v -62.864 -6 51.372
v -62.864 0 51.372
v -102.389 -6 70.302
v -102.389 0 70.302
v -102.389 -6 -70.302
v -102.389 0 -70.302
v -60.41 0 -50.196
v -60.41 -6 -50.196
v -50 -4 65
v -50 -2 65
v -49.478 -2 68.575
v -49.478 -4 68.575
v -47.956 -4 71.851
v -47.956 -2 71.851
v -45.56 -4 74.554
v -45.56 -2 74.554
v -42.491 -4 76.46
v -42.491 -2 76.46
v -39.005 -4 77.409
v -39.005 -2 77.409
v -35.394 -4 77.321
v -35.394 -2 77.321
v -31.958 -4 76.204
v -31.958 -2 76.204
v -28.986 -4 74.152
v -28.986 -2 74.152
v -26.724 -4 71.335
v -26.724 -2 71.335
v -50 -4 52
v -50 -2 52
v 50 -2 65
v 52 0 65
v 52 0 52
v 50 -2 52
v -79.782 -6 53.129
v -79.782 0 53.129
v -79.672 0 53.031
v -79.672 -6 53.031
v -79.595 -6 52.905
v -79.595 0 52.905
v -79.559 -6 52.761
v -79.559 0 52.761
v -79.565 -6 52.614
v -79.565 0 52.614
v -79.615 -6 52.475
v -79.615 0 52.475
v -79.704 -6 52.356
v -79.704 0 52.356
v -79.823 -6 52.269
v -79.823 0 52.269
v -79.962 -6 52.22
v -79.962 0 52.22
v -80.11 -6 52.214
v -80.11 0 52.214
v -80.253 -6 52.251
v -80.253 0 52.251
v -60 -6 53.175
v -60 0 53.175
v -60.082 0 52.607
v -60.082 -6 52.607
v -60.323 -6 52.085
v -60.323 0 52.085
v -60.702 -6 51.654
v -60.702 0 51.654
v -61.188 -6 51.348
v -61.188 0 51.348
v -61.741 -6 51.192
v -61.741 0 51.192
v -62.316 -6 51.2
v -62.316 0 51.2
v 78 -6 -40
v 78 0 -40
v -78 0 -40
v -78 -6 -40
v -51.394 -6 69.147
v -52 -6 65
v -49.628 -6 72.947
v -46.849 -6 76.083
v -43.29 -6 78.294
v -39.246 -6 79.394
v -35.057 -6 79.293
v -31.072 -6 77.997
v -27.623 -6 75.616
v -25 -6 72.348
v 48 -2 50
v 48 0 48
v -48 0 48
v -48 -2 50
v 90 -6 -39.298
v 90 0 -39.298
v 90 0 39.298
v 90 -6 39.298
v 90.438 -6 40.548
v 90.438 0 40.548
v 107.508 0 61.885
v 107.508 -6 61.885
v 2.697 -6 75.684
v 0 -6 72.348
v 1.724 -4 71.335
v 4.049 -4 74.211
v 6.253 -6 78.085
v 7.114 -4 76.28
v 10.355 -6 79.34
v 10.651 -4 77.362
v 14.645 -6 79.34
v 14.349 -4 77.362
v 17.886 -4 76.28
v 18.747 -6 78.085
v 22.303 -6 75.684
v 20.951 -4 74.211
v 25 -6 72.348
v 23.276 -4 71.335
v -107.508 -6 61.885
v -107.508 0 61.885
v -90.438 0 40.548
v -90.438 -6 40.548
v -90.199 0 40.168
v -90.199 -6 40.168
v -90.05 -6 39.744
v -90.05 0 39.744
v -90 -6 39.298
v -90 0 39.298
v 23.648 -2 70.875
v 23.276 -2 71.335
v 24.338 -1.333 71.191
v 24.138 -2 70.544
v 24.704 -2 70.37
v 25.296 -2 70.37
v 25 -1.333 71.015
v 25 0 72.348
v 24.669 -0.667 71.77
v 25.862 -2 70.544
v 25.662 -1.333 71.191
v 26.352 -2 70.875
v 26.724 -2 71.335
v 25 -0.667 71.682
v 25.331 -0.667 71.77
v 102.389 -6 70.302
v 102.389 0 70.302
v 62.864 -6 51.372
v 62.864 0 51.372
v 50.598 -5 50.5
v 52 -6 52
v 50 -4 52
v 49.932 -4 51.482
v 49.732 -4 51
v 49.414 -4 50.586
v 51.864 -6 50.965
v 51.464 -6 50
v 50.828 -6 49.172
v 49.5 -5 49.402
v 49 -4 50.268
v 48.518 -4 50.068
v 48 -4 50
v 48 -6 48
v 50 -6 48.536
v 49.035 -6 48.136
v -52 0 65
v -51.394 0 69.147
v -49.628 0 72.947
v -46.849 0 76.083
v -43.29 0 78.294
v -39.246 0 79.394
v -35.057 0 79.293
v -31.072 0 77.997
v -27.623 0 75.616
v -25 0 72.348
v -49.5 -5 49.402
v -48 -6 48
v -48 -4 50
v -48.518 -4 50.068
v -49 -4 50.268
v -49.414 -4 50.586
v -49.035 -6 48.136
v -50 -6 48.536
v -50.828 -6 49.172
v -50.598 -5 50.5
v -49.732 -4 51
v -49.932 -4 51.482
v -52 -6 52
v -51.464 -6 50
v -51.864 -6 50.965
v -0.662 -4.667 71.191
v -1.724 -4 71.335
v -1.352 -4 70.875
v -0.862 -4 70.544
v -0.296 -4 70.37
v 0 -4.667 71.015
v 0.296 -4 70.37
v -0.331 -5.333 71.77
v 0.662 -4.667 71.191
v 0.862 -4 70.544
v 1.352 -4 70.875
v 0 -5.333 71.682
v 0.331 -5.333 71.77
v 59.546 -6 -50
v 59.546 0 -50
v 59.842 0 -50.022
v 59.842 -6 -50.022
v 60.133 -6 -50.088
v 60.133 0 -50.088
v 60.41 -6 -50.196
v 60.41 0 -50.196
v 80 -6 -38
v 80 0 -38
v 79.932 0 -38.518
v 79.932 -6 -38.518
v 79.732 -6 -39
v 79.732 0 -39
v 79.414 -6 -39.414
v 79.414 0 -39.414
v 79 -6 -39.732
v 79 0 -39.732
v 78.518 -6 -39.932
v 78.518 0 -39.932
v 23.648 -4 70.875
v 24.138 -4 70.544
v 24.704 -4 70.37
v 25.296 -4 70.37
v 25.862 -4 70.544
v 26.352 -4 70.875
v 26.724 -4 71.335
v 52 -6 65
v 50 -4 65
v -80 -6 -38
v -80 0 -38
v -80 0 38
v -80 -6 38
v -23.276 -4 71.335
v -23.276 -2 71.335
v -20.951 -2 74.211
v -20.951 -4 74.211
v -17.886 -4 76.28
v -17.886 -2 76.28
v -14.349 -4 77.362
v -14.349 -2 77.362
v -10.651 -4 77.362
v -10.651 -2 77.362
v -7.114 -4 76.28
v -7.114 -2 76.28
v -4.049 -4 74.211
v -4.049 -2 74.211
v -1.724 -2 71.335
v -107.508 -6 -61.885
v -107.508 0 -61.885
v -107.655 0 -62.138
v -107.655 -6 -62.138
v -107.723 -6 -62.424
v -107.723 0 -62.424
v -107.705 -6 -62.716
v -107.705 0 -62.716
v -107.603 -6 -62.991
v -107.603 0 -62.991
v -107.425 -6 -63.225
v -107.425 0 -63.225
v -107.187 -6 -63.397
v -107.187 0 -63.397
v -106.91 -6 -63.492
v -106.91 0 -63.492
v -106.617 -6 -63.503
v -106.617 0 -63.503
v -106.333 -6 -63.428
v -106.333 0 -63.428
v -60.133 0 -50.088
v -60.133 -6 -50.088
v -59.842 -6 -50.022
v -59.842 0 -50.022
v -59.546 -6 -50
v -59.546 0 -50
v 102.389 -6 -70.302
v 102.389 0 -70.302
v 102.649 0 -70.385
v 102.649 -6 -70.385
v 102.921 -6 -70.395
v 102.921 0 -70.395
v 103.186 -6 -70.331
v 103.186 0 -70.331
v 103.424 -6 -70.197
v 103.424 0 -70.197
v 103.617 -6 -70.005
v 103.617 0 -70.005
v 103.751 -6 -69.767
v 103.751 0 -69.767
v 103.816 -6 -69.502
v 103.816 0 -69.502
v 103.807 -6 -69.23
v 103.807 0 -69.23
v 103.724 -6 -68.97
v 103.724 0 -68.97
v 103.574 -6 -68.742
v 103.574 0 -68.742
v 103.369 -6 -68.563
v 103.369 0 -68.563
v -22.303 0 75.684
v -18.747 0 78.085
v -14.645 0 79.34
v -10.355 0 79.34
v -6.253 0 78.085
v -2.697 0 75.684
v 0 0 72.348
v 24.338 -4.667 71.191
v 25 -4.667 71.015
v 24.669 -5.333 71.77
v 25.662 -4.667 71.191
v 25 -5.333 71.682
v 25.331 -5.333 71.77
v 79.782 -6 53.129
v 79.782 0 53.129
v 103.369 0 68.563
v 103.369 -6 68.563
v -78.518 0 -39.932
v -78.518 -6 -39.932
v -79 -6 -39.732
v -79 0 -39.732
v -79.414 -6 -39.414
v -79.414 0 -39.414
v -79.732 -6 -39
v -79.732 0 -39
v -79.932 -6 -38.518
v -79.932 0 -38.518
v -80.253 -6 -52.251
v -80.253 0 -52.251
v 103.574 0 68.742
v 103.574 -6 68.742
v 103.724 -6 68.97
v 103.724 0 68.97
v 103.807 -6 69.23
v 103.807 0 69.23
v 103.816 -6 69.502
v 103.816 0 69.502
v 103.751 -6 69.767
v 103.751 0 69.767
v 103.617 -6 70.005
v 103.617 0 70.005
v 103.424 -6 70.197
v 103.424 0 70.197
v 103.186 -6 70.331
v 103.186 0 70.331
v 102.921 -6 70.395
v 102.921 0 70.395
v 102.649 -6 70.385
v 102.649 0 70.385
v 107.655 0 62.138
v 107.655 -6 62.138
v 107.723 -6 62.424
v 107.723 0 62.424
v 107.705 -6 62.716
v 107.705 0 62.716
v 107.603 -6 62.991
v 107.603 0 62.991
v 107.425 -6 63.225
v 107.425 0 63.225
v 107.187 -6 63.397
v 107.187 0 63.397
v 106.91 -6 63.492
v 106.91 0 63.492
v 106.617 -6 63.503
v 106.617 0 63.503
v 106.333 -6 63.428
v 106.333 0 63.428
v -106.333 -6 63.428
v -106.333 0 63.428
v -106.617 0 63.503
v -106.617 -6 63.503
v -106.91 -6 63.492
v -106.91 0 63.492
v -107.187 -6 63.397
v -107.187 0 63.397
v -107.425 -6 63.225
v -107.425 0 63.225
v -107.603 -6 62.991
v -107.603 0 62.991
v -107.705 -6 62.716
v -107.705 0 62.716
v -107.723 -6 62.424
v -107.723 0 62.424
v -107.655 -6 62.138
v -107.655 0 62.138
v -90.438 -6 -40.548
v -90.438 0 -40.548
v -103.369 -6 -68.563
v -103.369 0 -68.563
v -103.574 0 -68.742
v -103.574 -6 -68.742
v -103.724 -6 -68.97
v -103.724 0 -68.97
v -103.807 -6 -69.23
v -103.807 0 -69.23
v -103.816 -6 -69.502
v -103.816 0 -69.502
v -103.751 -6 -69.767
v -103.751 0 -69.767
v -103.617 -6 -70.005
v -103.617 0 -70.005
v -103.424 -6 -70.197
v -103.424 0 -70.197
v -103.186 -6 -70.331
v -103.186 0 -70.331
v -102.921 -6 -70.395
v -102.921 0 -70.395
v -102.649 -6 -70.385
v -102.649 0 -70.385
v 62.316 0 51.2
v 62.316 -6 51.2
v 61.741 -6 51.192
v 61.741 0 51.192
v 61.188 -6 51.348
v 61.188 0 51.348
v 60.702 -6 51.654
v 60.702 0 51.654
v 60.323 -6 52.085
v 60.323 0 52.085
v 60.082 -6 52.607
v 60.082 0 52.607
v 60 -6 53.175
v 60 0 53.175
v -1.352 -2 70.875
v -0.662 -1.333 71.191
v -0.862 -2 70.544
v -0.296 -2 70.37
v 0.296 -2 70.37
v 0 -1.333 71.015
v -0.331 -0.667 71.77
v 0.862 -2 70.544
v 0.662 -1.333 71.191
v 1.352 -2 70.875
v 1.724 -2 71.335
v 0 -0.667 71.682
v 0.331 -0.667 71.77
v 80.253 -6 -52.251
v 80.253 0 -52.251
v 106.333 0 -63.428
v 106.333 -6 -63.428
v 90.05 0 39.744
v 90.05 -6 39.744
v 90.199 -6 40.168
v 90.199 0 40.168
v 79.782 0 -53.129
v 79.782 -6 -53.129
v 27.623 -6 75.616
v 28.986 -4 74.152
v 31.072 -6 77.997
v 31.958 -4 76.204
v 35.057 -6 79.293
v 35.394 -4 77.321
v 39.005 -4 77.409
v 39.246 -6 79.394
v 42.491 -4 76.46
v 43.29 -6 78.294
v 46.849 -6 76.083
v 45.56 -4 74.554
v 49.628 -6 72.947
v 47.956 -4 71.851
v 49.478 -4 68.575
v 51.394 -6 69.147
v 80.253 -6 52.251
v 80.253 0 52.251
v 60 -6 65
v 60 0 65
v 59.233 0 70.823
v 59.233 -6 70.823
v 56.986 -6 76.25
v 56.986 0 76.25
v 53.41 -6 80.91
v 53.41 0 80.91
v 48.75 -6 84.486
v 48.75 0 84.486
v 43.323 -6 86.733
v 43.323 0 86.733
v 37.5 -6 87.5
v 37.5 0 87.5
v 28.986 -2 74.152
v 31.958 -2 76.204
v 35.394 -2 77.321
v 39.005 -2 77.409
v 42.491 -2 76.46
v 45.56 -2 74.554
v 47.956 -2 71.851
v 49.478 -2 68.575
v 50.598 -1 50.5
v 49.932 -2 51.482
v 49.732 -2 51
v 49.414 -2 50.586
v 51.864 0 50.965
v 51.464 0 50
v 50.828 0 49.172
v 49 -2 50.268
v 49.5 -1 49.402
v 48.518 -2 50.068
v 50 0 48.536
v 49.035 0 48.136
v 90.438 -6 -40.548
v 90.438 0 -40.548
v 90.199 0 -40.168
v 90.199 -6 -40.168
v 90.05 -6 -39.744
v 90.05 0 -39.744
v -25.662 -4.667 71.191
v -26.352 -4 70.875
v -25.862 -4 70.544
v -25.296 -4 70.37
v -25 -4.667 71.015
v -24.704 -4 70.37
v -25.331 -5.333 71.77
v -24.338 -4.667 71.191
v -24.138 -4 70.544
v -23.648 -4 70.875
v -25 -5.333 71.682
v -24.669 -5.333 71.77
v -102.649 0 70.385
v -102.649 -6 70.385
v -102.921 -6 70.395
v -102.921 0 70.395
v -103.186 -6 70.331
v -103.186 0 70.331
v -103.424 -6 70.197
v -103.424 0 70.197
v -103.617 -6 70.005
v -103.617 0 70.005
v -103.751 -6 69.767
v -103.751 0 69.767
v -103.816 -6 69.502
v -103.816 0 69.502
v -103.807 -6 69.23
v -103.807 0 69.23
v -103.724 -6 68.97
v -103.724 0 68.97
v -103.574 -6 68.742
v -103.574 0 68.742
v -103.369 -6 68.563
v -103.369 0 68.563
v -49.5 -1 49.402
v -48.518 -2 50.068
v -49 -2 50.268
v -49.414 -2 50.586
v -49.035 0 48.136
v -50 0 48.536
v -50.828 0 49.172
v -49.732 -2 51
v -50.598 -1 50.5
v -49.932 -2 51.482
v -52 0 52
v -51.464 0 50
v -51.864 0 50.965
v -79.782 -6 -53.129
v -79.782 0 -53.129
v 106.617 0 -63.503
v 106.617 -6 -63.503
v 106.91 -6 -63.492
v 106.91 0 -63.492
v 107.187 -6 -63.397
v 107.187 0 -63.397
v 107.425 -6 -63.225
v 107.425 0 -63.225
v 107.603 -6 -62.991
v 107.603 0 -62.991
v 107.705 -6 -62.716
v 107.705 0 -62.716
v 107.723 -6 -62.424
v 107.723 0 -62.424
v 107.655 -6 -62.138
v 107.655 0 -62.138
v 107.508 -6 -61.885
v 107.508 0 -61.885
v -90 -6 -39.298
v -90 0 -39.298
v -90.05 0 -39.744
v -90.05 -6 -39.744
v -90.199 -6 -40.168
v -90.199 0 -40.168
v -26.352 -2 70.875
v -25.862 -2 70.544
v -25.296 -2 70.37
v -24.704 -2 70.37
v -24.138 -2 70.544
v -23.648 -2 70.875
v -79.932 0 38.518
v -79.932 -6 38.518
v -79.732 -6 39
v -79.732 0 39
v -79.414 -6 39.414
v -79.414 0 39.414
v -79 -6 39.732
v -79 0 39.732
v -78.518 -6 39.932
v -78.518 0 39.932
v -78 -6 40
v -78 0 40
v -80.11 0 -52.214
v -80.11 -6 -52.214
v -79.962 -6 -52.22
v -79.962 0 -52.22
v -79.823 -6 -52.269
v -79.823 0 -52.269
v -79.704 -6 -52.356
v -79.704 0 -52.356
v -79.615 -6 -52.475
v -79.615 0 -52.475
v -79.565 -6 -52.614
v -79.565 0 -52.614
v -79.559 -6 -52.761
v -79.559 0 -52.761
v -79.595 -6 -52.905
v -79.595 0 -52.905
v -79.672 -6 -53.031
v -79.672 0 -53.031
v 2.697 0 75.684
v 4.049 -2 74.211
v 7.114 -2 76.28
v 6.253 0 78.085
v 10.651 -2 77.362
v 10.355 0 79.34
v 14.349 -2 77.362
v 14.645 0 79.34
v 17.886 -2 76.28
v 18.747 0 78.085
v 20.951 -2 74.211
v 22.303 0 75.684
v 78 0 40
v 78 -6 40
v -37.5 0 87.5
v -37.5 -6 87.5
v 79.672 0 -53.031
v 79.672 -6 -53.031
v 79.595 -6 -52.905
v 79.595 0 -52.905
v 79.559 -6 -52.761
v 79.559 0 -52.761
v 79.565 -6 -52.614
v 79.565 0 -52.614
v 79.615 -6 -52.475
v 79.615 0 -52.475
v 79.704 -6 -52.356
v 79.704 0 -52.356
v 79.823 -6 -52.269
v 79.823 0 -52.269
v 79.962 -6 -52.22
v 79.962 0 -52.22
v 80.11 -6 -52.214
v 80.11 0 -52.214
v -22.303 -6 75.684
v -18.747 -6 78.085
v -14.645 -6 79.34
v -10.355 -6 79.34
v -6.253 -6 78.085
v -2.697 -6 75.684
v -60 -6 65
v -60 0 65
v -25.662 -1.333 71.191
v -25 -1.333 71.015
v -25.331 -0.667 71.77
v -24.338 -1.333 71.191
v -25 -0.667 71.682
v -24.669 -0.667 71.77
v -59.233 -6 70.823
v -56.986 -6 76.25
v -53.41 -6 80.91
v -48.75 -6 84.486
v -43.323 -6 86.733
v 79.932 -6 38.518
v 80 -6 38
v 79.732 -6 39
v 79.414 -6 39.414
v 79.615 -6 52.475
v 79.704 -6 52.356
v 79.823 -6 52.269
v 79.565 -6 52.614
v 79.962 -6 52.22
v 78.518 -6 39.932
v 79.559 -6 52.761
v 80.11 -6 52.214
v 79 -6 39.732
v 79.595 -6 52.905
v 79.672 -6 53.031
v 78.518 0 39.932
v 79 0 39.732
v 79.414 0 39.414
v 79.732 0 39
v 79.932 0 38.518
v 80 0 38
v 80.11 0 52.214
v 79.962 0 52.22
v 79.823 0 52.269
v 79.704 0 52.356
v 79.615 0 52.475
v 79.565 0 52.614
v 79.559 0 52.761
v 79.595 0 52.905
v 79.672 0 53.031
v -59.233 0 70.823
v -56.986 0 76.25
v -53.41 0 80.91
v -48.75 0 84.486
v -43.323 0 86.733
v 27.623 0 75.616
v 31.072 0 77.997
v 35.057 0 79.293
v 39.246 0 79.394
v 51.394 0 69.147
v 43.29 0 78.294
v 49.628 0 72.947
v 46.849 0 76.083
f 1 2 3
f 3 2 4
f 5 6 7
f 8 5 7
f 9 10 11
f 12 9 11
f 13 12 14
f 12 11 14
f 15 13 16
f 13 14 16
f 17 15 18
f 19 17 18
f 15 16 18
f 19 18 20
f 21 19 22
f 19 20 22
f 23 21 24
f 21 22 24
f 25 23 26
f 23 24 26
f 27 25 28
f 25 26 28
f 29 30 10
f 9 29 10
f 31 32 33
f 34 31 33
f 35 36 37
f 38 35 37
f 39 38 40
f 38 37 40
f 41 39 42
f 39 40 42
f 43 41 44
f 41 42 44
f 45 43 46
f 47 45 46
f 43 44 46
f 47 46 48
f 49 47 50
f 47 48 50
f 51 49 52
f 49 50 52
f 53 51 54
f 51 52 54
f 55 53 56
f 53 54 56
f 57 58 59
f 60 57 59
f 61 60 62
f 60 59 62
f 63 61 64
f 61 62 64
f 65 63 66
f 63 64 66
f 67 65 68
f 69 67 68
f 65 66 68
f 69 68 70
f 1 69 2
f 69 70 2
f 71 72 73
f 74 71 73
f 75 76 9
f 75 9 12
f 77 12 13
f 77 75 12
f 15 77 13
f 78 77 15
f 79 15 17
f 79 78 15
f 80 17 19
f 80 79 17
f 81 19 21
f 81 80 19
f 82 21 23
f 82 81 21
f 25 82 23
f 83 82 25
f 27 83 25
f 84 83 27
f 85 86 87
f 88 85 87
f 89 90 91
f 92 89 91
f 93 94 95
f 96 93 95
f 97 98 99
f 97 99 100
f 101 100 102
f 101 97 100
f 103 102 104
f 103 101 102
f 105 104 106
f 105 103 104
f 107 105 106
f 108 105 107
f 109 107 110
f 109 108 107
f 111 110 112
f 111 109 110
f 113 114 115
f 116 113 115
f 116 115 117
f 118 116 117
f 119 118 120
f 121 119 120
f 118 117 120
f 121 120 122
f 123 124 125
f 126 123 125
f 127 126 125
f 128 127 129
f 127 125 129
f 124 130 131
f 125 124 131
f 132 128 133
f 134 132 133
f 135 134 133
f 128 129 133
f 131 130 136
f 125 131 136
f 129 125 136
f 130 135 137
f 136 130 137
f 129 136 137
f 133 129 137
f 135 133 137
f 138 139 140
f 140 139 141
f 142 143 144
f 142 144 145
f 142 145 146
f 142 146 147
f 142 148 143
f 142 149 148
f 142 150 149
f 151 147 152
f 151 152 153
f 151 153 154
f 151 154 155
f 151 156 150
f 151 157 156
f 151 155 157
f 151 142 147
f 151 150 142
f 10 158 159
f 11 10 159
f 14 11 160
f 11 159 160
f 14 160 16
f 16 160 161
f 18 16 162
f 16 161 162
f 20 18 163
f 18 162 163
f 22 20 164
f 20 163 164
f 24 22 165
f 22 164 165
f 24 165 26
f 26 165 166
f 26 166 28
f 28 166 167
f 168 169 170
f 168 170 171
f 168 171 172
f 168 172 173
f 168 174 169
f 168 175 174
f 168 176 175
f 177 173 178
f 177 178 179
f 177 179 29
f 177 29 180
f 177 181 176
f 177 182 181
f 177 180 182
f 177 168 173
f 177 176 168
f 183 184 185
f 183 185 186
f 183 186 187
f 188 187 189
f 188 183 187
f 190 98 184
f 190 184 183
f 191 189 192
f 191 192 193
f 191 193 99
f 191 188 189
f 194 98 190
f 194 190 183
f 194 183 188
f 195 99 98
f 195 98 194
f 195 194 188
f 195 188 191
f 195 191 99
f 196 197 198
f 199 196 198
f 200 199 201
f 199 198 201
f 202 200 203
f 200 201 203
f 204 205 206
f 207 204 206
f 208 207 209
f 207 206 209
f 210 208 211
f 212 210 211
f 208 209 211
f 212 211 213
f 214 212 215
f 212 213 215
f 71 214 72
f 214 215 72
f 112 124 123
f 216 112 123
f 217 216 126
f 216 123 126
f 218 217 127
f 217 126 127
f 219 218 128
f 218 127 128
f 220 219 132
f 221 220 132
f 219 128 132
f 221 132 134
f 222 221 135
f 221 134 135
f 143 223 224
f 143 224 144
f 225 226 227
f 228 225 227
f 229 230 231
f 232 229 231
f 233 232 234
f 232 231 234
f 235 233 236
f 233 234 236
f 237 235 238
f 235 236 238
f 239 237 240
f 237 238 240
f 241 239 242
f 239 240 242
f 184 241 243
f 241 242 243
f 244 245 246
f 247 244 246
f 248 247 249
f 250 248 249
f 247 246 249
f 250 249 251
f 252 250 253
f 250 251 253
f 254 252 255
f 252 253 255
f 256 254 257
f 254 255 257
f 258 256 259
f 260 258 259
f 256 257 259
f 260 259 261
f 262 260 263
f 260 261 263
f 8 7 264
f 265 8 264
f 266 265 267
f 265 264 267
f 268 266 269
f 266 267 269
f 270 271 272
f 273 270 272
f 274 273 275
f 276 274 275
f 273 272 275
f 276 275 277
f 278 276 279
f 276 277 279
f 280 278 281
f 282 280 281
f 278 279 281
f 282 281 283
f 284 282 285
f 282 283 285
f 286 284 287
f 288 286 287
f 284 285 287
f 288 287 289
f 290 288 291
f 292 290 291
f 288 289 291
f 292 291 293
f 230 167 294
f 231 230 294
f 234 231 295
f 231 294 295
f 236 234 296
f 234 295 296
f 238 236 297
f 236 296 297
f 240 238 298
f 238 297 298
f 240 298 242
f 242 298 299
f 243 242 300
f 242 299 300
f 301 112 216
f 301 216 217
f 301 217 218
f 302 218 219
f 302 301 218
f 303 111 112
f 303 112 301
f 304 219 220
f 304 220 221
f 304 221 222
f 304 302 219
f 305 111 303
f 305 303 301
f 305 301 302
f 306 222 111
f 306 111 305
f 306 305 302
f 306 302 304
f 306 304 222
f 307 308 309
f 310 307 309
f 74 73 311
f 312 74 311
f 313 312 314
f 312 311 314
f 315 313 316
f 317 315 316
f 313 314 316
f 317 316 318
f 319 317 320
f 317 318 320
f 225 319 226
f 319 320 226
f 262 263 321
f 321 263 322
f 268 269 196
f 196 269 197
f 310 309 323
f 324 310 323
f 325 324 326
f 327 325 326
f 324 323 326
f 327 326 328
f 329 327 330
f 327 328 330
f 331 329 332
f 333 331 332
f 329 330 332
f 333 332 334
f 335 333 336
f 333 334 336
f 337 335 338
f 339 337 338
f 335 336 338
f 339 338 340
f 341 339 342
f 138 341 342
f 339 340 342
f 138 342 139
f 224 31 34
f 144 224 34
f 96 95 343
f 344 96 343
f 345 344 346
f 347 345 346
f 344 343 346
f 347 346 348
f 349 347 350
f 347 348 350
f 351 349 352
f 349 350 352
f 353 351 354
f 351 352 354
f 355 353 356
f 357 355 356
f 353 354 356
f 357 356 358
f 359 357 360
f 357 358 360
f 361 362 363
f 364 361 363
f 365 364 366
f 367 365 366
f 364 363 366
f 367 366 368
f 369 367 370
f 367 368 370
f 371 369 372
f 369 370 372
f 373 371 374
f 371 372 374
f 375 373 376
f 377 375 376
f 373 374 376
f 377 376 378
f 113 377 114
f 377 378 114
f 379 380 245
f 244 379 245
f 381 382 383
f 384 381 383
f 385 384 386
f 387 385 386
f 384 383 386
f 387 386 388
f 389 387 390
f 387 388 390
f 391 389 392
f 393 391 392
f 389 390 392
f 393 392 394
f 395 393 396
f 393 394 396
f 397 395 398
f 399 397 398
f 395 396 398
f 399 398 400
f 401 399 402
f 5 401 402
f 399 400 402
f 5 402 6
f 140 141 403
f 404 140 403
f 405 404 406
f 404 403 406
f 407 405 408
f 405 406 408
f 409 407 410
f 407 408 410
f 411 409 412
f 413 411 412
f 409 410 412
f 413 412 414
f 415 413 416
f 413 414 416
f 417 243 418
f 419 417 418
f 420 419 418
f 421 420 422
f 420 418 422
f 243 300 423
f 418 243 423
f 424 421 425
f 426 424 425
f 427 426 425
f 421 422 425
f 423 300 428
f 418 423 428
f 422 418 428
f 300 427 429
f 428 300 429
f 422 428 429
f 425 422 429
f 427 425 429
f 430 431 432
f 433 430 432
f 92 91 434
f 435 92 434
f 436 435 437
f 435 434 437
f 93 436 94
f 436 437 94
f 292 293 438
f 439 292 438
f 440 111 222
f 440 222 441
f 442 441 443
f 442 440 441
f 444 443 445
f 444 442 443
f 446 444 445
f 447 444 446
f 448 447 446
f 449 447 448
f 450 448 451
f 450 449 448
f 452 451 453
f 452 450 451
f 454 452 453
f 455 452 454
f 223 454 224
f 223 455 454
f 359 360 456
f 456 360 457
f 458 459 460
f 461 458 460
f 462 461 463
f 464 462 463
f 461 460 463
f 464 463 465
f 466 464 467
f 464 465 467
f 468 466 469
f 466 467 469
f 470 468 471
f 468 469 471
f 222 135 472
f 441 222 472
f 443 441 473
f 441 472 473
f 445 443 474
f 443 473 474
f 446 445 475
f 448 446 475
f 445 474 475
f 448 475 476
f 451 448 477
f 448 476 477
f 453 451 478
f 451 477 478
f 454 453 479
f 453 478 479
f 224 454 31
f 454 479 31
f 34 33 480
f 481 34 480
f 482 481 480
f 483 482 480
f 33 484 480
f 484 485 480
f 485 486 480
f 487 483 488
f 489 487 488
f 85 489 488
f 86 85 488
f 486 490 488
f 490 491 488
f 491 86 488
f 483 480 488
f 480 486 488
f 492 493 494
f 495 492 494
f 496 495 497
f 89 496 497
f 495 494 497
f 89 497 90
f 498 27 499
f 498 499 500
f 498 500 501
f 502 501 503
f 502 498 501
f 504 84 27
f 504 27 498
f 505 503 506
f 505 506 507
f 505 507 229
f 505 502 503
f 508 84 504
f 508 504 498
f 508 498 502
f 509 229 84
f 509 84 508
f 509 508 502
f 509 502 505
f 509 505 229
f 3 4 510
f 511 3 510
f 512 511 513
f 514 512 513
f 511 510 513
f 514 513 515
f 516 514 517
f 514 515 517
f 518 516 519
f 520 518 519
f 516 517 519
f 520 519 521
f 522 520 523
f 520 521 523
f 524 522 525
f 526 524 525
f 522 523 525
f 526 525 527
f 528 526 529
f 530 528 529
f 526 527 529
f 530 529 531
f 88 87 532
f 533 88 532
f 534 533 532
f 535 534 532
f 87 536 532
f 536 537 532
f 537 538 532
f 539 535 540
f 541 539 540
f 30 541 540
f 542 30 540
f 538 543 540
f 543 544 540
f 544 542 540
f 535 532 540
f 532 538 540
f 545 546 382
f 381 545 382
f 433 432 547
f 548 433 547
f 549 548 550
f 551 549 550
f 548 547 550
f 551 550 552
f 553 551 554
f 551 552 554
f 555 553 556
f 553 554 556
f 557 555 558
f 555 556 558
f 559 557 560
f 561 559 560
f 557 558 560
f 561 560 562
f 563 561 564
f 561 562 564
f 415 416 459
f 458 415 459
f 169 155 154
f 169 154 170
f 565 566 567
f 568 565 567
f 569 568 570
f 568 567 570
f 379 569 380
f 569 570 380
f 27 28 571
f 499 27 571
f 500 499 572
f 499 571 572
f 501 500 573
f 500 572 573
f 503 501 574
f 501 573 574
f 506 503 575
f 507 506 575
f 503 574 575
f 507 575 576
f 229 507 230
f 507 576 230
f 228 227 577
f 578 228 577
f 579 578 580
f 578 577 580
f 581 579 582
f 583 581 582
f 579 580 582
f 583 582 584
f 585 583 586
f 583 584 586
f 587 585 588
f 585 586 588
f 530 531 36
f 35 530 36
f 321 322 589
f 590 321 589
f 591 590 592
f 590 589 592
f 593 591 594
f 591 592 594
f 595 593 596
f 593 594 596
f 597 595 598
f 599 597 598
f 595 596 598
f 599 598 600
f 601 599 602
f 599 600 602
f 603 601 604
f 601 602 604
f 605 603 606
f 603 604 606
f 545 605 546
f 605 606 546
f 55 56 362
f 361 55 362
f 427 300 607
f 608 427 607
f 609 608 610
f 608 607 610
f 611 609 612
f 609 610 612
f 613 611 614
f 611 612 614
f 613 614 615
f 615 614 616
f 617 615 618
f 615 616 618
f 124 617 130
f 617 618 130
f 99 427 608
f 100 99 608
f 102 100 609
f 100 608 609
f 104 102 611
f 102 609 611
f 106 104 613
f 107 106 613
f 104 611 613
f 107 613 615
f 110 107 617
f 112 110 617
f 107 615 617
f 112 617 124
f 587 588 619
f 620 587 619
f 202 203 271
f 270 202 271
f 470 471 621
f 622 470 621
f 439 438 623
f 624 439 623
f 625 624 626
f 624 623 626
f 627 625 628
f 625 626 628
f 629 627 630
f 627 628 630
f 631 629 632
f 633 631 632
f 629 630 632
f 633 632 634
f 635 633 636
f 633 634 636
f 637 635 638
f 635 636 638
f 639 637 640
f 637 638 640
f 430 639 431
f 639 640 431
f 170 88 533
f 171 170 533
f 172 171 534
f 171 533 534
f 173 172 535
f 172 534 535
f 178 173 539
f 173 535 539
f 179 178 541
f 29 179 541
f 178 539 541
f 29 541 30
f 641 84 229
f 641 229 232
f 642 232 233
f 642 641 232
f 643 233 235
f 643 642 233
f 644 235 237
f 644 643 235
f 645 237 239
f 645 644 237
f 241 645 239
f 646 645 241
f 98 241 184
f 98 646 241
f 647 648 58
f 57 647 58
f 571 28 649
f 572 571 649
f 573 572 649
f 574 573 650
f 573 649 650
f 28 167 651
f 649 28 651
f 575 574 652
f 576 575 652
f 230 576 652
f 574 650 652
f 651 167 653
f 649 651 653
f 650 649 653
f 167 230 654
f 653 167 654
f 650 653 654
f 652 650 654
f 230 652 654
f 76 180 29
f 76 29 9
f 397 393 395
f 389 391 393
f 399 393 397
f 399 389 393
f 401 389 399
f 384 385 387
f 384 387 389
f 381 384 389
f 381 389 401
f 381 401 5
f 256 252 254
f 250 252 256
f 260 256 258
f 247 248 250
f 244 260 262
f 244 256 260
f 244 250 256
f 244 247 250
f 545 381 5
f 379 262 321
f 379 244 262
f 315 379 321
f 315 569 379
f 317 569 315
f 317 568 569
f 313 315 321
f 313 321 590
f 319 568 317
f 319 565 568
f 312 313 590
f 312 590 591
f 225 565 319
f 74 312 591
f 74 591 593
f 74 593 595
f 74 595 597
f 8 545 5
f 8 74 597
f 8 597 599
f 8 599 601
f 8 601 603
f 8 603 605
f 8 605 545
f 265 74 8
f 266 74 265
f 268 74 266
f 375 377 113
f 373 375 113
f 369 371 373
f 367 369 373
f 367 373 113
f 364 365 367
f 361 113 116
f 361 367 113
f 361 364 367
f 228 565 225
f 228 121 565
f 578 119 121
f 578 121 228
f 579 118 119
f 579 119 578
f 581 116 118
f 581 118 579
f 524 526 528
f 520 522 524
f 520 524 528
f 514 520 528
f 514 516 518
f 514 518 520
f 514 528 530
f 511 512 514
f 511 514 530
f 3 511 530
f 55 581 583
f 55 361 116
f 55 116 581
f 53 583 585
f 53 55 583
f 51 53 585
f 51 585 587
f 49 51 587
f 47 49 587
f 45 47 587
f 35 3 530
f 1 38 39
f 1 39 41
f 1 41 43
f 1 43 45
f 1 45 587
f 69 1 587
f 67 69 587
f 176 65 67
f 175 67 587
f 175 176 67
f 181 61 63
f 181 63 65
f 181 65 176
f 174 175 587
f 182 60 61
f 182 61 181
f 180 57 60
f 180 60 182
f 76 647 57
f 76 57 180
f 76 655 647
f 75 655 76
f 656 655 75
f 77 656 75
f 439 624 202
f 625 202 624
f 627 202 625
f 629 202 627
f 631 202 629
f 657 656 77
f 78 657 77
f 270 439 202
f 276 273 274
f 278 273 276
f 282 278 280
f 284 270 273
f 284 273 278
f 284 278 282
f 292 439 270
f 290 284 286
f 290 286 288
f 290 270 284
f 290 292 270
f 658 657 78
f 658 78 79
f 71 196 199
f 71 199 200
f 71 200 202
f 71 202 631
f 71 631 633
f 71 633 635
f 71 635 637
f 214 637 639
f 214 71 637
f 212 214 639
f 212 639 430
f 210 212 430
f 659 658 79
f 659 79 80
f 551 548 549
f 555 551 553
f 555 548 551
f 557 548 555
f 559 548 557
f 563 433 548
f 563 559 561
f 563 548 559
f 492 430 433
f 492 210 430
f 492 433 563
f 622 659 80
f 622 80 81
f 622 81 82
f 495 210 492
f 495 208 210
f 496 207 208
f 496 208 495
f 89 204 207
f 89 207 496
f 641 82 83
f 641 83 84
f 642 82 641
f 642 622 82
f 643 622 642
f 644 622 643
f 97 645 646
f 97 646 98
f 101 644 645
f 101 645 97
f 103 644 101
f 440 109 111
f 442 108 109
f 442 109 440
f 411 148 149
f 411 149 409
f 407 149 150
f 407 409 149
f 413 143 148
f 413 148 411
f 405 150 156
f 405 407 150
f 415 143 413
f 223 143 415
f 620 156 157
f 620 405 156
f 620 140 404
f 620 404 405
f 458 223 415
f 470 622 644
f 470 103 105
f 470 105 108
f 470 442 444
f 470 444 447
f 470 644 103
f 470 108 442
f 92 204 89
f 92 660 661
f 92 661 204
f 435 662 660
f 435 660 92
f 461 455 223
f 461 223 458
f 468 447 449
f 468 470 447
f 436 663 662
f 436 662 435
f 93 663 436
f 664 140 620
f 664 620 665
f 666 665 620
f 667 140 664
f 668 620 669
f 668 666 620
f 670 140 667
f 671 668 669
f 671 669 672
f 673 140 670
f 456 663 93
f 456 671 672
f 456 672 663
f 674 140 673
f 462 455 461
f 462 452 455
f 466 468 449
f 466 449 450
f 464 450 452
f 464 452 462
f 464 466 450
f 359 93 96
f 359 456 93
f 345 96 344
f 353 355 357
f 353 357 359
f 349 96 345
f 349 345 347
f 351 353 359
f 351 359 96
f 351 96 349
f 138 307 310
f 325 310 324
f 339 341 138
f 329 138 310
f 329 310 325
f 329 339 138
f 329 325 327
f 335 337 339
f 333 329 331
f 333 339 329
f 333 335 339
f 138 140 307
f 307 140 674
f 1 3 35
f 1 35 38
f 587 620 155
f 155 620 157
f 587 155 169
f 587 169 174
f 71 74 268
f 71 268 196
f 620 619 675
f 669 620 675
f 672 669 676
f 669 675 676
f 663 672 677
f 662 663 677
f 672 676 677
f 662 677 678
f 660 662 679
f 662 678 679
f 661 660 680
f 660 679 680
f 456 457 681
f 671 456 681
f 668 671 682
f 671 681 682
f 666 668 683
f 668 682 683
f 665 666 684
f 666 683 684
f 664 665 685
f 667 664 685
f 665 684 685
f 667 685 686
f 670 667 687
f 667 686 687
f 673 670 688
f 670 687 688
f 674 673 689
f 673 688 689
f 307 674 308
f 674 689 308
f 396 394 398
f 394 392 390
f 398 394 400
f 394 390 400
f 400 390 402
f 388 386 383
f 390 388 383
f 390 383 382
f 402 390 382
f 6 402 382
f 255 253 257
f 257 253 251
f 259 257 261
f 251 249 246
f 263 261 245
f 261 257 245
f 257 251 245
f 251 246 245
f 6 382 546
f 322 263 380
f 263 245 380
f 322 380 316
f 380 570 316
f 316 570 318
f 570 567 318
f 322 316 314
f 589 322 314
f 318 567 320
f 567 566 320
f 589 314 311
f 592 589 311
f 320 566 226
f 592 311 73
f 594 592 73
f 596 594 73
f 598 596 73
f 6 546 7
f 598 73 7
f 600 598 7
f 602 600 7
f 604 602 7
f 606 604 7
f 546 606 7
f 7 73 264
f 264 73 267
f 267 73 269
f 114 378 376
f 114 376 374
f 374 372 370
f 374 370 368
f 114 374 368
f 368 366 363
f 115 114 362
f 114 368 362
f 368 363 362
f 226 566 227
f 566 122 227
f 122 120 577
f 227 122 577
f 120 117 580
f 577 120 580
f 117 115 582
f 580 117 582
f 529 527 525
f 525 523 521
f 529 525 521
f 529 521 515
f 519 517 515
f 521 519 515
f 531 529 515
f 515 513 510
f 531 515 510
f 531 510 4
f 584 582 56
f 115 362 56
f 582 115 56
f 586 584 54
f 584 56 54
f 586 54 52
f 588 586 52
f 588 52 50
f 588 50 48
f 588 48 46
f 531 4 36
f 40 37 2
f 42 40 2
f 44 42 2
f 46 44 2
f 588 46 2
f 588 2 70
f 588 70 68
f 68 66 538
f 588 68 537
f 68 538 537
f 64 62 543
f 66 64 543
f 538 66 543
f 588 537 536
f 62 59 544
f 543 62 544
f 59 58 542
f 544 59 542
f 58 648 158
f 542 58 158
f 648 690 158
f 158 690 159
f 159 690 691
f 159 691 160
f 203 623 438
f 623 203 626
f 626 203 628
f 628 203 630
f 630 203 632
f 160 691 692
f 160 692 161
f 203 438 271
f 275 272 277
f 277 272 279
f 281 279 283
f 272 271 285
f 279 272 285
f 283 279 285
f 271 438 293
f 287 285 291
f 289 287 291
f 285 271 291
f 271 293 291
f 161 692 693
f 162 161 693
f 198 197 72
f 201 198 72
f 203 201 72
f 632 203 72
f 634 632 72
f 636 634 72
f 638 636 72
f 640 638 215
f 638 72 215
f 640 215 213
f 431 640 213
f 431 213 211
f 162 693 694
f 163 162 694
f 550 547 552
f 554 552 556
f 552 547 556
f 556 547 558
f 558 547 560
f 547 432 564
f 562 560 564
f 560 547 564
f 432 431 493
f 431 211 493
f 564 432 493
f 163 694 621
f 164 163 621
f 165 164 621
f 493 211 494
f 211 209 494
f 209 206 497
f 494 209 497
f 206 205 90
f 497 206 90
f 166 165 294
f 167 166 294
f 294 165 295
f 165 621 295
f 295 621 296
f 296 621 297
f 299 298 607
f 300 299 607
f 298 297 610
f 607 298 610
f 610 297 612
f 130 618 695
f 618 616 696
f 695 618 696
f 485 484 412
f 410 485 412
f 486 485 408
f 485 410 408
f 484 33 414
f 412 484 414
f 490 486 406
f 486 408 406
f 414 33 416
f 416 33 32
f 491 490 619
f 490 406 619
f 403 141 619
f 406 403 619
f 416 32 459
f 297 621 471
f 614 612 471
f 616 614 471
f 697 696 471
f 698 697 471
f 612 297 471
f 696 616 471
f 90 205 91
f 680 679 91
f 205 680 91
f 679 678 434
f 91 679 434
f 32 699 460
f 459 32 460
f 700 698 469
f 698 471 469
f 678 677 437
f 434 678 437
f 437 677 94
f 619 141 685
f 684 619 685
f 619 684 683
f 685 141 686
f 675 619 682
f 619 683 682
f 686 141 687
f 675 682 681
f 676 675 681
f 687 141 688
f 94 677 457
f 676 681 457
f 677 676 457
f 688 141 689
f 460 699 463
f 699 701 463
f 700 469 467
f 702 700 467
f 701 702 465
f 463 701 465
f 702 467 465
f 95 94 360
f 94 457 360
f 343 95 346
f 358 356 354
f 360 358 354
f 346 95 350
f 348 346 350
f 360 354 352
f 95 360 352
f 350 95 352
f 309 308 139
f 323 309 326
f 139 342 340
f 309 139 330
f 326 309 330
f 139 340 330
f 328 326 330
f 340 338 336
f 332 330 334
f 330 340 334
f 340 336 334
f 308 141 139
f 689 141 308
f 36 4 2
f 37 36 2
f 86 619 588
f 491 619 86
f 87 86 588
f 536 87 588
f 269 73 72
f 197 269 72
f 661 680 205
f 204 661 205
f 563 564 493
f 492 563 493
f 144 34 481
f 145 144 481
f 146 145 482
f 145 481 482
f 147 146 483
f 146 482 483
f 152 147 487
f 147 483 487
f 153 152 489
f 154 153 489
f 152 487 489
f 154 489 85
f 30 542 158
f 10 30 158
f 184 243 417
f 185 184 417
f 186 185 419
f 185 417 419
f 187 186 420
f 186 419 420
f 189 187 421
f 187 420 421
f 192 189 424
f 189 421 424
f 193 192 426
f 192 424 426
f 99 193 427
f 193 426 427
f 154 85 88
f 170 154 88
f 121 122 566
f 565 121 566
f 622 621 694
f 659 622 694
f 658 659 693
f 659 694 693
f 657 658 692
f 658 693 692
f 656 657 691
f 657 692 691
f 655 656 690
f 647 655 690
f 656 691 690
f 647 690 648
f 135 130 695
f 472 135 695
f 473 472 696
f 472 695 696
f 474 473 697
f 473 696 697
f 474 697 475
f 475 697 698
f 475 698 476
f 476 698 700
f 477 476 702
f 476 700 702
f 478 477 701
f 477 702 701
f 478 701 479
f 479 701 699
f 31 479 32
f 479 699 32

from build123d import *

# Parameters (mm, degrees)
F1_DEPTH = 6
F2_SIZE  = 1.99999


# Not quite as in the source:
# - a fillet or chamfer is up to 0.001 mm smaller than in the source, because OpenCascade refuses the exact size


with BuildPart() as f1:
    # F0 (on Front) → F1 (new body)
    with BuildSketch(Plane.XZ):
        with BuildLine():
            Line((-59.5457699822, -50), (59.5457699822, -50))
            ThreePointArc((59.5457699822, -50), (59.9887196894, -50.0496678342), (60.409669044, -50.1962044431))
            Line((60.409669044, -50.1962044431), (102.3891955872, -70.3016279512))
            ThreePointArc((102.3891955872, -70.3016279512), (103.6924020371, -69.8905574143), (103.3686877569, -68.5629523894))
            Line((103.3686877569, -68.5629523894), (79.7822069148, -53.1292204996))
            ThreePointArc((79.7822069148, -53.1292204996), (79.6153206959, -52.4745670657), (80.2529378835, -52.2512590929))
            Line((80.2529378835, -52.2512590929), (106.3328214803, -63.428352063))
            ThreePointArc((106.3328214803, -63.428352063), (107.5225378807, -63.1147703845), (107.5076095883, -61.8845119854))
            Line((107.5076095883, -61.8845119854), (90.4382623811, -40.5478279764))
            ThreePointArc((90.4382623811, -40.5478279764), (90.1127433617, -39.9604517642), (90, -39.2984378813))
            Line((90, -39.2984378813), (90, 39.2984378813))
            ThreePointArc((90, 39.2984378813), (90.1127433617, 39.9604517642), (90.4382623811, 40.5478279764))
            Line((90.4382623811, 40.5478279764), (107.5076095883, 61.8845119854))
            ThreePointArc((107.5076095883, 61.8845119854), (107.5225378807, 63.1147703845), (106.3328214803, 63.428352063))
            Line((106.3328214803, 63.428352063), (80.2529378835, 52.2512590929))
            ThreePointArc((80.2529378835, 52.2512590929), (79.6153206959, 52.4745670657), (79.7822069148, 53.1292204996))
            Line((79.7822069148, 53.1292204996), (103.3686877569, 68.5629523894))
            ThreePointArc((103.3686877569, 68.5629523894), (103.6924020371, 69.8905574143), (102.3891955872, 70.3016279512))
            Line((102.3891955872, 70.3016279512), (62.8638990618, 51.3716186976))
            ThreePointArc((62.8638990618, 51.3716186976), (60.9341196417, 51.4831084128), (60, 53.1754142545))
            Line((60, 53.1754142545), (60, 65))
            ThreePointArc((60, 65), (53.4099025767, 80.9099025767), (37.5, 87.5))
            Line((37.5, 87.5), (0, 87.5))
            Line((0, 87.5), (-37.5, 87.5))
            ThreePointArc((-37.5, 87.5), (-53.4099025767, 80.9099025767), (-60, 65))
            Line((-60, 65), (-60, 53.1754142545))
            ThreePointArc((-60, 53.1754142545), (-60.9341196417, 51.4831084128), (-62.8638990618, 51.3716186976))
            Line((-62.8638990618, 51.3716186976), (-102.3891955872, 70.3016279512))
            ThreePointArc((-102.3891955872, 70.3016279512), (-103.6924020371, 69.8905574143), (-103.3686877569, 68.5629523894))
            Line((-103.3686877569, 68.5629523894), (-79.7822069148, 53.1292204996))
            ThreePointArc((-79.7822069148, 53.1292204996), (-79.6153206959, 52.4745670657), (-80.2529378835, 52.2512590929))
            Line((-80.2529378835, 52.2512590929), (-106.3328214803, 63.428352063))
            ThreePointArc((-106.3328214803, 63.428352063), (-107.5225378807, 63.1147703845), (-107.5076095883, 61.8845119854))
            Line((-107.5076095883, 61.8845119854), (-90.4382623811, 40.5478279764))
            ThreePointArc((-90.4382623811, 40.5478279764), (-90.1127433617, 39.9604517642), (-90, 39.2984378813))
            Line((-90, 39.2984378813), (-90, -39.2984378813))
            ThreePointArc((-90, -39.2984378813), (-90.1127433617, -39.9604517642), (-90.4382623811, -40.5478279764))
            Line((-90.4382623811, -40.5478279764), (-107.5076095883, -61.8845119854))
            ThreePointArc((-107.5076095883, -61.8845119854), (-107.5225378807, -63.1147703845), (-106.3328214803, -63.428352063))
            Line((-106.3328214803, -63.428352063), (-80.2529378835, -52.2512590929))
            ThreePointArc((-80.2529378835, -52.2512590929), (-79.6153206959, -52.4745670657), (-79.7822069148, -53.1292204996))
            Line((-79.7822069148, -53.1292204996), (-103.3686877569, -68.5629523894))
            ThreePointArc((-103.3686877569, -68.5629523894), (-103.6924020371, -69.8905574143), (-102.3891955872, -70.3016279512))
            Line((-102.3891955872, -70.3016279512), (-60.409669044, -50.1962044431))
            ThreePointArc((-60.409669044, -50.1962044431), (-59.9887196894, -50.0496678342), (-59.5457699822, -50))
        make_face()
        with BuildLine():
            Line((-78, 40), (78, 40))
            ThreePointArc((78, 40), (79.4142135624, 39.4142135624), (80, 38))
            Line((80, 38), (80, -38))
            ThreePointArc((80, -38), (79.4142135624, -39.4142135624), (78, -40))
            Line((78, -40), (-78, -40))
            ThreePointArc((-78, -40), (-79.4142135624, -39.4142135624), (-80, -38))
            Line((-80, -38), (-80, 38))
            ThreePointArc((-80, 38), (-79.4142135624, 39.4142135624), (-78, 40))
        make_face(mode=Mode.SUBTRACT)
        with BuildLine():
            Line((48, 50), (40, 50))
            Line((40, 50), (0, 50))
            Line((0, 50), (-25, 50))
            Line((-25, 50), (-40, 50))
            Line((-40, 50), (-48, 50))
            ThreePointArc((-48, 50), (-49.4142135624, 50.5857864376), (-50, 52))
            Line((-50, 52), (-50, 65))
            ThreePointArc((-50, 65), (-40.7826608215, 77.0612660169), (-26.724137931, 71.3348872658))
            ThreePointArc((-26.724137931, 71.3348872658), (-25, 70.3484692283), (-23.275862069, 71.3348872658))
            ThreePointArc((-23.275862069, 71.3348872658), (-12.5, 77.5), (-1.724137931, 71.3348872658))
            ThreePointArc((-1.724137931, 71.3348872658), (0, 70.3484692283), (1.724137931, 71.3348872658))
            ThreePointArc((1.724137931, 71.3348872658), (12.5, 77.5), (23.275862069, 71.3348872658))
            ThreePointArc((23.275862069, 71.3348872658), (25, 70.3484692283), (26.724137931, 71.3348872658))
            ThreePointArc((26.724137931, 71.3348872658), (40.7826608215, 77.0612660169), (50, 65))
            Line((50, 65), (50, 52))
            ThreePointArc((50, 52), (49.4142135624, 50.5857864376), (48, 50))
        make_face(mode=Mode.SUBTRACT)
    extrude(amount=F1_DEPTH)

    # F2 (size 2 in the source; OpenCascade refuses exactly that, so slightly less here)
    f2_edges = [f1.edges().sort_by_distance(p)[0] for p in [
        (0, -6, 50),
        (0, 0, 50),
    ]]
    chamfer(f2_edges, length=F2_SIZE)


solid = f1.part
